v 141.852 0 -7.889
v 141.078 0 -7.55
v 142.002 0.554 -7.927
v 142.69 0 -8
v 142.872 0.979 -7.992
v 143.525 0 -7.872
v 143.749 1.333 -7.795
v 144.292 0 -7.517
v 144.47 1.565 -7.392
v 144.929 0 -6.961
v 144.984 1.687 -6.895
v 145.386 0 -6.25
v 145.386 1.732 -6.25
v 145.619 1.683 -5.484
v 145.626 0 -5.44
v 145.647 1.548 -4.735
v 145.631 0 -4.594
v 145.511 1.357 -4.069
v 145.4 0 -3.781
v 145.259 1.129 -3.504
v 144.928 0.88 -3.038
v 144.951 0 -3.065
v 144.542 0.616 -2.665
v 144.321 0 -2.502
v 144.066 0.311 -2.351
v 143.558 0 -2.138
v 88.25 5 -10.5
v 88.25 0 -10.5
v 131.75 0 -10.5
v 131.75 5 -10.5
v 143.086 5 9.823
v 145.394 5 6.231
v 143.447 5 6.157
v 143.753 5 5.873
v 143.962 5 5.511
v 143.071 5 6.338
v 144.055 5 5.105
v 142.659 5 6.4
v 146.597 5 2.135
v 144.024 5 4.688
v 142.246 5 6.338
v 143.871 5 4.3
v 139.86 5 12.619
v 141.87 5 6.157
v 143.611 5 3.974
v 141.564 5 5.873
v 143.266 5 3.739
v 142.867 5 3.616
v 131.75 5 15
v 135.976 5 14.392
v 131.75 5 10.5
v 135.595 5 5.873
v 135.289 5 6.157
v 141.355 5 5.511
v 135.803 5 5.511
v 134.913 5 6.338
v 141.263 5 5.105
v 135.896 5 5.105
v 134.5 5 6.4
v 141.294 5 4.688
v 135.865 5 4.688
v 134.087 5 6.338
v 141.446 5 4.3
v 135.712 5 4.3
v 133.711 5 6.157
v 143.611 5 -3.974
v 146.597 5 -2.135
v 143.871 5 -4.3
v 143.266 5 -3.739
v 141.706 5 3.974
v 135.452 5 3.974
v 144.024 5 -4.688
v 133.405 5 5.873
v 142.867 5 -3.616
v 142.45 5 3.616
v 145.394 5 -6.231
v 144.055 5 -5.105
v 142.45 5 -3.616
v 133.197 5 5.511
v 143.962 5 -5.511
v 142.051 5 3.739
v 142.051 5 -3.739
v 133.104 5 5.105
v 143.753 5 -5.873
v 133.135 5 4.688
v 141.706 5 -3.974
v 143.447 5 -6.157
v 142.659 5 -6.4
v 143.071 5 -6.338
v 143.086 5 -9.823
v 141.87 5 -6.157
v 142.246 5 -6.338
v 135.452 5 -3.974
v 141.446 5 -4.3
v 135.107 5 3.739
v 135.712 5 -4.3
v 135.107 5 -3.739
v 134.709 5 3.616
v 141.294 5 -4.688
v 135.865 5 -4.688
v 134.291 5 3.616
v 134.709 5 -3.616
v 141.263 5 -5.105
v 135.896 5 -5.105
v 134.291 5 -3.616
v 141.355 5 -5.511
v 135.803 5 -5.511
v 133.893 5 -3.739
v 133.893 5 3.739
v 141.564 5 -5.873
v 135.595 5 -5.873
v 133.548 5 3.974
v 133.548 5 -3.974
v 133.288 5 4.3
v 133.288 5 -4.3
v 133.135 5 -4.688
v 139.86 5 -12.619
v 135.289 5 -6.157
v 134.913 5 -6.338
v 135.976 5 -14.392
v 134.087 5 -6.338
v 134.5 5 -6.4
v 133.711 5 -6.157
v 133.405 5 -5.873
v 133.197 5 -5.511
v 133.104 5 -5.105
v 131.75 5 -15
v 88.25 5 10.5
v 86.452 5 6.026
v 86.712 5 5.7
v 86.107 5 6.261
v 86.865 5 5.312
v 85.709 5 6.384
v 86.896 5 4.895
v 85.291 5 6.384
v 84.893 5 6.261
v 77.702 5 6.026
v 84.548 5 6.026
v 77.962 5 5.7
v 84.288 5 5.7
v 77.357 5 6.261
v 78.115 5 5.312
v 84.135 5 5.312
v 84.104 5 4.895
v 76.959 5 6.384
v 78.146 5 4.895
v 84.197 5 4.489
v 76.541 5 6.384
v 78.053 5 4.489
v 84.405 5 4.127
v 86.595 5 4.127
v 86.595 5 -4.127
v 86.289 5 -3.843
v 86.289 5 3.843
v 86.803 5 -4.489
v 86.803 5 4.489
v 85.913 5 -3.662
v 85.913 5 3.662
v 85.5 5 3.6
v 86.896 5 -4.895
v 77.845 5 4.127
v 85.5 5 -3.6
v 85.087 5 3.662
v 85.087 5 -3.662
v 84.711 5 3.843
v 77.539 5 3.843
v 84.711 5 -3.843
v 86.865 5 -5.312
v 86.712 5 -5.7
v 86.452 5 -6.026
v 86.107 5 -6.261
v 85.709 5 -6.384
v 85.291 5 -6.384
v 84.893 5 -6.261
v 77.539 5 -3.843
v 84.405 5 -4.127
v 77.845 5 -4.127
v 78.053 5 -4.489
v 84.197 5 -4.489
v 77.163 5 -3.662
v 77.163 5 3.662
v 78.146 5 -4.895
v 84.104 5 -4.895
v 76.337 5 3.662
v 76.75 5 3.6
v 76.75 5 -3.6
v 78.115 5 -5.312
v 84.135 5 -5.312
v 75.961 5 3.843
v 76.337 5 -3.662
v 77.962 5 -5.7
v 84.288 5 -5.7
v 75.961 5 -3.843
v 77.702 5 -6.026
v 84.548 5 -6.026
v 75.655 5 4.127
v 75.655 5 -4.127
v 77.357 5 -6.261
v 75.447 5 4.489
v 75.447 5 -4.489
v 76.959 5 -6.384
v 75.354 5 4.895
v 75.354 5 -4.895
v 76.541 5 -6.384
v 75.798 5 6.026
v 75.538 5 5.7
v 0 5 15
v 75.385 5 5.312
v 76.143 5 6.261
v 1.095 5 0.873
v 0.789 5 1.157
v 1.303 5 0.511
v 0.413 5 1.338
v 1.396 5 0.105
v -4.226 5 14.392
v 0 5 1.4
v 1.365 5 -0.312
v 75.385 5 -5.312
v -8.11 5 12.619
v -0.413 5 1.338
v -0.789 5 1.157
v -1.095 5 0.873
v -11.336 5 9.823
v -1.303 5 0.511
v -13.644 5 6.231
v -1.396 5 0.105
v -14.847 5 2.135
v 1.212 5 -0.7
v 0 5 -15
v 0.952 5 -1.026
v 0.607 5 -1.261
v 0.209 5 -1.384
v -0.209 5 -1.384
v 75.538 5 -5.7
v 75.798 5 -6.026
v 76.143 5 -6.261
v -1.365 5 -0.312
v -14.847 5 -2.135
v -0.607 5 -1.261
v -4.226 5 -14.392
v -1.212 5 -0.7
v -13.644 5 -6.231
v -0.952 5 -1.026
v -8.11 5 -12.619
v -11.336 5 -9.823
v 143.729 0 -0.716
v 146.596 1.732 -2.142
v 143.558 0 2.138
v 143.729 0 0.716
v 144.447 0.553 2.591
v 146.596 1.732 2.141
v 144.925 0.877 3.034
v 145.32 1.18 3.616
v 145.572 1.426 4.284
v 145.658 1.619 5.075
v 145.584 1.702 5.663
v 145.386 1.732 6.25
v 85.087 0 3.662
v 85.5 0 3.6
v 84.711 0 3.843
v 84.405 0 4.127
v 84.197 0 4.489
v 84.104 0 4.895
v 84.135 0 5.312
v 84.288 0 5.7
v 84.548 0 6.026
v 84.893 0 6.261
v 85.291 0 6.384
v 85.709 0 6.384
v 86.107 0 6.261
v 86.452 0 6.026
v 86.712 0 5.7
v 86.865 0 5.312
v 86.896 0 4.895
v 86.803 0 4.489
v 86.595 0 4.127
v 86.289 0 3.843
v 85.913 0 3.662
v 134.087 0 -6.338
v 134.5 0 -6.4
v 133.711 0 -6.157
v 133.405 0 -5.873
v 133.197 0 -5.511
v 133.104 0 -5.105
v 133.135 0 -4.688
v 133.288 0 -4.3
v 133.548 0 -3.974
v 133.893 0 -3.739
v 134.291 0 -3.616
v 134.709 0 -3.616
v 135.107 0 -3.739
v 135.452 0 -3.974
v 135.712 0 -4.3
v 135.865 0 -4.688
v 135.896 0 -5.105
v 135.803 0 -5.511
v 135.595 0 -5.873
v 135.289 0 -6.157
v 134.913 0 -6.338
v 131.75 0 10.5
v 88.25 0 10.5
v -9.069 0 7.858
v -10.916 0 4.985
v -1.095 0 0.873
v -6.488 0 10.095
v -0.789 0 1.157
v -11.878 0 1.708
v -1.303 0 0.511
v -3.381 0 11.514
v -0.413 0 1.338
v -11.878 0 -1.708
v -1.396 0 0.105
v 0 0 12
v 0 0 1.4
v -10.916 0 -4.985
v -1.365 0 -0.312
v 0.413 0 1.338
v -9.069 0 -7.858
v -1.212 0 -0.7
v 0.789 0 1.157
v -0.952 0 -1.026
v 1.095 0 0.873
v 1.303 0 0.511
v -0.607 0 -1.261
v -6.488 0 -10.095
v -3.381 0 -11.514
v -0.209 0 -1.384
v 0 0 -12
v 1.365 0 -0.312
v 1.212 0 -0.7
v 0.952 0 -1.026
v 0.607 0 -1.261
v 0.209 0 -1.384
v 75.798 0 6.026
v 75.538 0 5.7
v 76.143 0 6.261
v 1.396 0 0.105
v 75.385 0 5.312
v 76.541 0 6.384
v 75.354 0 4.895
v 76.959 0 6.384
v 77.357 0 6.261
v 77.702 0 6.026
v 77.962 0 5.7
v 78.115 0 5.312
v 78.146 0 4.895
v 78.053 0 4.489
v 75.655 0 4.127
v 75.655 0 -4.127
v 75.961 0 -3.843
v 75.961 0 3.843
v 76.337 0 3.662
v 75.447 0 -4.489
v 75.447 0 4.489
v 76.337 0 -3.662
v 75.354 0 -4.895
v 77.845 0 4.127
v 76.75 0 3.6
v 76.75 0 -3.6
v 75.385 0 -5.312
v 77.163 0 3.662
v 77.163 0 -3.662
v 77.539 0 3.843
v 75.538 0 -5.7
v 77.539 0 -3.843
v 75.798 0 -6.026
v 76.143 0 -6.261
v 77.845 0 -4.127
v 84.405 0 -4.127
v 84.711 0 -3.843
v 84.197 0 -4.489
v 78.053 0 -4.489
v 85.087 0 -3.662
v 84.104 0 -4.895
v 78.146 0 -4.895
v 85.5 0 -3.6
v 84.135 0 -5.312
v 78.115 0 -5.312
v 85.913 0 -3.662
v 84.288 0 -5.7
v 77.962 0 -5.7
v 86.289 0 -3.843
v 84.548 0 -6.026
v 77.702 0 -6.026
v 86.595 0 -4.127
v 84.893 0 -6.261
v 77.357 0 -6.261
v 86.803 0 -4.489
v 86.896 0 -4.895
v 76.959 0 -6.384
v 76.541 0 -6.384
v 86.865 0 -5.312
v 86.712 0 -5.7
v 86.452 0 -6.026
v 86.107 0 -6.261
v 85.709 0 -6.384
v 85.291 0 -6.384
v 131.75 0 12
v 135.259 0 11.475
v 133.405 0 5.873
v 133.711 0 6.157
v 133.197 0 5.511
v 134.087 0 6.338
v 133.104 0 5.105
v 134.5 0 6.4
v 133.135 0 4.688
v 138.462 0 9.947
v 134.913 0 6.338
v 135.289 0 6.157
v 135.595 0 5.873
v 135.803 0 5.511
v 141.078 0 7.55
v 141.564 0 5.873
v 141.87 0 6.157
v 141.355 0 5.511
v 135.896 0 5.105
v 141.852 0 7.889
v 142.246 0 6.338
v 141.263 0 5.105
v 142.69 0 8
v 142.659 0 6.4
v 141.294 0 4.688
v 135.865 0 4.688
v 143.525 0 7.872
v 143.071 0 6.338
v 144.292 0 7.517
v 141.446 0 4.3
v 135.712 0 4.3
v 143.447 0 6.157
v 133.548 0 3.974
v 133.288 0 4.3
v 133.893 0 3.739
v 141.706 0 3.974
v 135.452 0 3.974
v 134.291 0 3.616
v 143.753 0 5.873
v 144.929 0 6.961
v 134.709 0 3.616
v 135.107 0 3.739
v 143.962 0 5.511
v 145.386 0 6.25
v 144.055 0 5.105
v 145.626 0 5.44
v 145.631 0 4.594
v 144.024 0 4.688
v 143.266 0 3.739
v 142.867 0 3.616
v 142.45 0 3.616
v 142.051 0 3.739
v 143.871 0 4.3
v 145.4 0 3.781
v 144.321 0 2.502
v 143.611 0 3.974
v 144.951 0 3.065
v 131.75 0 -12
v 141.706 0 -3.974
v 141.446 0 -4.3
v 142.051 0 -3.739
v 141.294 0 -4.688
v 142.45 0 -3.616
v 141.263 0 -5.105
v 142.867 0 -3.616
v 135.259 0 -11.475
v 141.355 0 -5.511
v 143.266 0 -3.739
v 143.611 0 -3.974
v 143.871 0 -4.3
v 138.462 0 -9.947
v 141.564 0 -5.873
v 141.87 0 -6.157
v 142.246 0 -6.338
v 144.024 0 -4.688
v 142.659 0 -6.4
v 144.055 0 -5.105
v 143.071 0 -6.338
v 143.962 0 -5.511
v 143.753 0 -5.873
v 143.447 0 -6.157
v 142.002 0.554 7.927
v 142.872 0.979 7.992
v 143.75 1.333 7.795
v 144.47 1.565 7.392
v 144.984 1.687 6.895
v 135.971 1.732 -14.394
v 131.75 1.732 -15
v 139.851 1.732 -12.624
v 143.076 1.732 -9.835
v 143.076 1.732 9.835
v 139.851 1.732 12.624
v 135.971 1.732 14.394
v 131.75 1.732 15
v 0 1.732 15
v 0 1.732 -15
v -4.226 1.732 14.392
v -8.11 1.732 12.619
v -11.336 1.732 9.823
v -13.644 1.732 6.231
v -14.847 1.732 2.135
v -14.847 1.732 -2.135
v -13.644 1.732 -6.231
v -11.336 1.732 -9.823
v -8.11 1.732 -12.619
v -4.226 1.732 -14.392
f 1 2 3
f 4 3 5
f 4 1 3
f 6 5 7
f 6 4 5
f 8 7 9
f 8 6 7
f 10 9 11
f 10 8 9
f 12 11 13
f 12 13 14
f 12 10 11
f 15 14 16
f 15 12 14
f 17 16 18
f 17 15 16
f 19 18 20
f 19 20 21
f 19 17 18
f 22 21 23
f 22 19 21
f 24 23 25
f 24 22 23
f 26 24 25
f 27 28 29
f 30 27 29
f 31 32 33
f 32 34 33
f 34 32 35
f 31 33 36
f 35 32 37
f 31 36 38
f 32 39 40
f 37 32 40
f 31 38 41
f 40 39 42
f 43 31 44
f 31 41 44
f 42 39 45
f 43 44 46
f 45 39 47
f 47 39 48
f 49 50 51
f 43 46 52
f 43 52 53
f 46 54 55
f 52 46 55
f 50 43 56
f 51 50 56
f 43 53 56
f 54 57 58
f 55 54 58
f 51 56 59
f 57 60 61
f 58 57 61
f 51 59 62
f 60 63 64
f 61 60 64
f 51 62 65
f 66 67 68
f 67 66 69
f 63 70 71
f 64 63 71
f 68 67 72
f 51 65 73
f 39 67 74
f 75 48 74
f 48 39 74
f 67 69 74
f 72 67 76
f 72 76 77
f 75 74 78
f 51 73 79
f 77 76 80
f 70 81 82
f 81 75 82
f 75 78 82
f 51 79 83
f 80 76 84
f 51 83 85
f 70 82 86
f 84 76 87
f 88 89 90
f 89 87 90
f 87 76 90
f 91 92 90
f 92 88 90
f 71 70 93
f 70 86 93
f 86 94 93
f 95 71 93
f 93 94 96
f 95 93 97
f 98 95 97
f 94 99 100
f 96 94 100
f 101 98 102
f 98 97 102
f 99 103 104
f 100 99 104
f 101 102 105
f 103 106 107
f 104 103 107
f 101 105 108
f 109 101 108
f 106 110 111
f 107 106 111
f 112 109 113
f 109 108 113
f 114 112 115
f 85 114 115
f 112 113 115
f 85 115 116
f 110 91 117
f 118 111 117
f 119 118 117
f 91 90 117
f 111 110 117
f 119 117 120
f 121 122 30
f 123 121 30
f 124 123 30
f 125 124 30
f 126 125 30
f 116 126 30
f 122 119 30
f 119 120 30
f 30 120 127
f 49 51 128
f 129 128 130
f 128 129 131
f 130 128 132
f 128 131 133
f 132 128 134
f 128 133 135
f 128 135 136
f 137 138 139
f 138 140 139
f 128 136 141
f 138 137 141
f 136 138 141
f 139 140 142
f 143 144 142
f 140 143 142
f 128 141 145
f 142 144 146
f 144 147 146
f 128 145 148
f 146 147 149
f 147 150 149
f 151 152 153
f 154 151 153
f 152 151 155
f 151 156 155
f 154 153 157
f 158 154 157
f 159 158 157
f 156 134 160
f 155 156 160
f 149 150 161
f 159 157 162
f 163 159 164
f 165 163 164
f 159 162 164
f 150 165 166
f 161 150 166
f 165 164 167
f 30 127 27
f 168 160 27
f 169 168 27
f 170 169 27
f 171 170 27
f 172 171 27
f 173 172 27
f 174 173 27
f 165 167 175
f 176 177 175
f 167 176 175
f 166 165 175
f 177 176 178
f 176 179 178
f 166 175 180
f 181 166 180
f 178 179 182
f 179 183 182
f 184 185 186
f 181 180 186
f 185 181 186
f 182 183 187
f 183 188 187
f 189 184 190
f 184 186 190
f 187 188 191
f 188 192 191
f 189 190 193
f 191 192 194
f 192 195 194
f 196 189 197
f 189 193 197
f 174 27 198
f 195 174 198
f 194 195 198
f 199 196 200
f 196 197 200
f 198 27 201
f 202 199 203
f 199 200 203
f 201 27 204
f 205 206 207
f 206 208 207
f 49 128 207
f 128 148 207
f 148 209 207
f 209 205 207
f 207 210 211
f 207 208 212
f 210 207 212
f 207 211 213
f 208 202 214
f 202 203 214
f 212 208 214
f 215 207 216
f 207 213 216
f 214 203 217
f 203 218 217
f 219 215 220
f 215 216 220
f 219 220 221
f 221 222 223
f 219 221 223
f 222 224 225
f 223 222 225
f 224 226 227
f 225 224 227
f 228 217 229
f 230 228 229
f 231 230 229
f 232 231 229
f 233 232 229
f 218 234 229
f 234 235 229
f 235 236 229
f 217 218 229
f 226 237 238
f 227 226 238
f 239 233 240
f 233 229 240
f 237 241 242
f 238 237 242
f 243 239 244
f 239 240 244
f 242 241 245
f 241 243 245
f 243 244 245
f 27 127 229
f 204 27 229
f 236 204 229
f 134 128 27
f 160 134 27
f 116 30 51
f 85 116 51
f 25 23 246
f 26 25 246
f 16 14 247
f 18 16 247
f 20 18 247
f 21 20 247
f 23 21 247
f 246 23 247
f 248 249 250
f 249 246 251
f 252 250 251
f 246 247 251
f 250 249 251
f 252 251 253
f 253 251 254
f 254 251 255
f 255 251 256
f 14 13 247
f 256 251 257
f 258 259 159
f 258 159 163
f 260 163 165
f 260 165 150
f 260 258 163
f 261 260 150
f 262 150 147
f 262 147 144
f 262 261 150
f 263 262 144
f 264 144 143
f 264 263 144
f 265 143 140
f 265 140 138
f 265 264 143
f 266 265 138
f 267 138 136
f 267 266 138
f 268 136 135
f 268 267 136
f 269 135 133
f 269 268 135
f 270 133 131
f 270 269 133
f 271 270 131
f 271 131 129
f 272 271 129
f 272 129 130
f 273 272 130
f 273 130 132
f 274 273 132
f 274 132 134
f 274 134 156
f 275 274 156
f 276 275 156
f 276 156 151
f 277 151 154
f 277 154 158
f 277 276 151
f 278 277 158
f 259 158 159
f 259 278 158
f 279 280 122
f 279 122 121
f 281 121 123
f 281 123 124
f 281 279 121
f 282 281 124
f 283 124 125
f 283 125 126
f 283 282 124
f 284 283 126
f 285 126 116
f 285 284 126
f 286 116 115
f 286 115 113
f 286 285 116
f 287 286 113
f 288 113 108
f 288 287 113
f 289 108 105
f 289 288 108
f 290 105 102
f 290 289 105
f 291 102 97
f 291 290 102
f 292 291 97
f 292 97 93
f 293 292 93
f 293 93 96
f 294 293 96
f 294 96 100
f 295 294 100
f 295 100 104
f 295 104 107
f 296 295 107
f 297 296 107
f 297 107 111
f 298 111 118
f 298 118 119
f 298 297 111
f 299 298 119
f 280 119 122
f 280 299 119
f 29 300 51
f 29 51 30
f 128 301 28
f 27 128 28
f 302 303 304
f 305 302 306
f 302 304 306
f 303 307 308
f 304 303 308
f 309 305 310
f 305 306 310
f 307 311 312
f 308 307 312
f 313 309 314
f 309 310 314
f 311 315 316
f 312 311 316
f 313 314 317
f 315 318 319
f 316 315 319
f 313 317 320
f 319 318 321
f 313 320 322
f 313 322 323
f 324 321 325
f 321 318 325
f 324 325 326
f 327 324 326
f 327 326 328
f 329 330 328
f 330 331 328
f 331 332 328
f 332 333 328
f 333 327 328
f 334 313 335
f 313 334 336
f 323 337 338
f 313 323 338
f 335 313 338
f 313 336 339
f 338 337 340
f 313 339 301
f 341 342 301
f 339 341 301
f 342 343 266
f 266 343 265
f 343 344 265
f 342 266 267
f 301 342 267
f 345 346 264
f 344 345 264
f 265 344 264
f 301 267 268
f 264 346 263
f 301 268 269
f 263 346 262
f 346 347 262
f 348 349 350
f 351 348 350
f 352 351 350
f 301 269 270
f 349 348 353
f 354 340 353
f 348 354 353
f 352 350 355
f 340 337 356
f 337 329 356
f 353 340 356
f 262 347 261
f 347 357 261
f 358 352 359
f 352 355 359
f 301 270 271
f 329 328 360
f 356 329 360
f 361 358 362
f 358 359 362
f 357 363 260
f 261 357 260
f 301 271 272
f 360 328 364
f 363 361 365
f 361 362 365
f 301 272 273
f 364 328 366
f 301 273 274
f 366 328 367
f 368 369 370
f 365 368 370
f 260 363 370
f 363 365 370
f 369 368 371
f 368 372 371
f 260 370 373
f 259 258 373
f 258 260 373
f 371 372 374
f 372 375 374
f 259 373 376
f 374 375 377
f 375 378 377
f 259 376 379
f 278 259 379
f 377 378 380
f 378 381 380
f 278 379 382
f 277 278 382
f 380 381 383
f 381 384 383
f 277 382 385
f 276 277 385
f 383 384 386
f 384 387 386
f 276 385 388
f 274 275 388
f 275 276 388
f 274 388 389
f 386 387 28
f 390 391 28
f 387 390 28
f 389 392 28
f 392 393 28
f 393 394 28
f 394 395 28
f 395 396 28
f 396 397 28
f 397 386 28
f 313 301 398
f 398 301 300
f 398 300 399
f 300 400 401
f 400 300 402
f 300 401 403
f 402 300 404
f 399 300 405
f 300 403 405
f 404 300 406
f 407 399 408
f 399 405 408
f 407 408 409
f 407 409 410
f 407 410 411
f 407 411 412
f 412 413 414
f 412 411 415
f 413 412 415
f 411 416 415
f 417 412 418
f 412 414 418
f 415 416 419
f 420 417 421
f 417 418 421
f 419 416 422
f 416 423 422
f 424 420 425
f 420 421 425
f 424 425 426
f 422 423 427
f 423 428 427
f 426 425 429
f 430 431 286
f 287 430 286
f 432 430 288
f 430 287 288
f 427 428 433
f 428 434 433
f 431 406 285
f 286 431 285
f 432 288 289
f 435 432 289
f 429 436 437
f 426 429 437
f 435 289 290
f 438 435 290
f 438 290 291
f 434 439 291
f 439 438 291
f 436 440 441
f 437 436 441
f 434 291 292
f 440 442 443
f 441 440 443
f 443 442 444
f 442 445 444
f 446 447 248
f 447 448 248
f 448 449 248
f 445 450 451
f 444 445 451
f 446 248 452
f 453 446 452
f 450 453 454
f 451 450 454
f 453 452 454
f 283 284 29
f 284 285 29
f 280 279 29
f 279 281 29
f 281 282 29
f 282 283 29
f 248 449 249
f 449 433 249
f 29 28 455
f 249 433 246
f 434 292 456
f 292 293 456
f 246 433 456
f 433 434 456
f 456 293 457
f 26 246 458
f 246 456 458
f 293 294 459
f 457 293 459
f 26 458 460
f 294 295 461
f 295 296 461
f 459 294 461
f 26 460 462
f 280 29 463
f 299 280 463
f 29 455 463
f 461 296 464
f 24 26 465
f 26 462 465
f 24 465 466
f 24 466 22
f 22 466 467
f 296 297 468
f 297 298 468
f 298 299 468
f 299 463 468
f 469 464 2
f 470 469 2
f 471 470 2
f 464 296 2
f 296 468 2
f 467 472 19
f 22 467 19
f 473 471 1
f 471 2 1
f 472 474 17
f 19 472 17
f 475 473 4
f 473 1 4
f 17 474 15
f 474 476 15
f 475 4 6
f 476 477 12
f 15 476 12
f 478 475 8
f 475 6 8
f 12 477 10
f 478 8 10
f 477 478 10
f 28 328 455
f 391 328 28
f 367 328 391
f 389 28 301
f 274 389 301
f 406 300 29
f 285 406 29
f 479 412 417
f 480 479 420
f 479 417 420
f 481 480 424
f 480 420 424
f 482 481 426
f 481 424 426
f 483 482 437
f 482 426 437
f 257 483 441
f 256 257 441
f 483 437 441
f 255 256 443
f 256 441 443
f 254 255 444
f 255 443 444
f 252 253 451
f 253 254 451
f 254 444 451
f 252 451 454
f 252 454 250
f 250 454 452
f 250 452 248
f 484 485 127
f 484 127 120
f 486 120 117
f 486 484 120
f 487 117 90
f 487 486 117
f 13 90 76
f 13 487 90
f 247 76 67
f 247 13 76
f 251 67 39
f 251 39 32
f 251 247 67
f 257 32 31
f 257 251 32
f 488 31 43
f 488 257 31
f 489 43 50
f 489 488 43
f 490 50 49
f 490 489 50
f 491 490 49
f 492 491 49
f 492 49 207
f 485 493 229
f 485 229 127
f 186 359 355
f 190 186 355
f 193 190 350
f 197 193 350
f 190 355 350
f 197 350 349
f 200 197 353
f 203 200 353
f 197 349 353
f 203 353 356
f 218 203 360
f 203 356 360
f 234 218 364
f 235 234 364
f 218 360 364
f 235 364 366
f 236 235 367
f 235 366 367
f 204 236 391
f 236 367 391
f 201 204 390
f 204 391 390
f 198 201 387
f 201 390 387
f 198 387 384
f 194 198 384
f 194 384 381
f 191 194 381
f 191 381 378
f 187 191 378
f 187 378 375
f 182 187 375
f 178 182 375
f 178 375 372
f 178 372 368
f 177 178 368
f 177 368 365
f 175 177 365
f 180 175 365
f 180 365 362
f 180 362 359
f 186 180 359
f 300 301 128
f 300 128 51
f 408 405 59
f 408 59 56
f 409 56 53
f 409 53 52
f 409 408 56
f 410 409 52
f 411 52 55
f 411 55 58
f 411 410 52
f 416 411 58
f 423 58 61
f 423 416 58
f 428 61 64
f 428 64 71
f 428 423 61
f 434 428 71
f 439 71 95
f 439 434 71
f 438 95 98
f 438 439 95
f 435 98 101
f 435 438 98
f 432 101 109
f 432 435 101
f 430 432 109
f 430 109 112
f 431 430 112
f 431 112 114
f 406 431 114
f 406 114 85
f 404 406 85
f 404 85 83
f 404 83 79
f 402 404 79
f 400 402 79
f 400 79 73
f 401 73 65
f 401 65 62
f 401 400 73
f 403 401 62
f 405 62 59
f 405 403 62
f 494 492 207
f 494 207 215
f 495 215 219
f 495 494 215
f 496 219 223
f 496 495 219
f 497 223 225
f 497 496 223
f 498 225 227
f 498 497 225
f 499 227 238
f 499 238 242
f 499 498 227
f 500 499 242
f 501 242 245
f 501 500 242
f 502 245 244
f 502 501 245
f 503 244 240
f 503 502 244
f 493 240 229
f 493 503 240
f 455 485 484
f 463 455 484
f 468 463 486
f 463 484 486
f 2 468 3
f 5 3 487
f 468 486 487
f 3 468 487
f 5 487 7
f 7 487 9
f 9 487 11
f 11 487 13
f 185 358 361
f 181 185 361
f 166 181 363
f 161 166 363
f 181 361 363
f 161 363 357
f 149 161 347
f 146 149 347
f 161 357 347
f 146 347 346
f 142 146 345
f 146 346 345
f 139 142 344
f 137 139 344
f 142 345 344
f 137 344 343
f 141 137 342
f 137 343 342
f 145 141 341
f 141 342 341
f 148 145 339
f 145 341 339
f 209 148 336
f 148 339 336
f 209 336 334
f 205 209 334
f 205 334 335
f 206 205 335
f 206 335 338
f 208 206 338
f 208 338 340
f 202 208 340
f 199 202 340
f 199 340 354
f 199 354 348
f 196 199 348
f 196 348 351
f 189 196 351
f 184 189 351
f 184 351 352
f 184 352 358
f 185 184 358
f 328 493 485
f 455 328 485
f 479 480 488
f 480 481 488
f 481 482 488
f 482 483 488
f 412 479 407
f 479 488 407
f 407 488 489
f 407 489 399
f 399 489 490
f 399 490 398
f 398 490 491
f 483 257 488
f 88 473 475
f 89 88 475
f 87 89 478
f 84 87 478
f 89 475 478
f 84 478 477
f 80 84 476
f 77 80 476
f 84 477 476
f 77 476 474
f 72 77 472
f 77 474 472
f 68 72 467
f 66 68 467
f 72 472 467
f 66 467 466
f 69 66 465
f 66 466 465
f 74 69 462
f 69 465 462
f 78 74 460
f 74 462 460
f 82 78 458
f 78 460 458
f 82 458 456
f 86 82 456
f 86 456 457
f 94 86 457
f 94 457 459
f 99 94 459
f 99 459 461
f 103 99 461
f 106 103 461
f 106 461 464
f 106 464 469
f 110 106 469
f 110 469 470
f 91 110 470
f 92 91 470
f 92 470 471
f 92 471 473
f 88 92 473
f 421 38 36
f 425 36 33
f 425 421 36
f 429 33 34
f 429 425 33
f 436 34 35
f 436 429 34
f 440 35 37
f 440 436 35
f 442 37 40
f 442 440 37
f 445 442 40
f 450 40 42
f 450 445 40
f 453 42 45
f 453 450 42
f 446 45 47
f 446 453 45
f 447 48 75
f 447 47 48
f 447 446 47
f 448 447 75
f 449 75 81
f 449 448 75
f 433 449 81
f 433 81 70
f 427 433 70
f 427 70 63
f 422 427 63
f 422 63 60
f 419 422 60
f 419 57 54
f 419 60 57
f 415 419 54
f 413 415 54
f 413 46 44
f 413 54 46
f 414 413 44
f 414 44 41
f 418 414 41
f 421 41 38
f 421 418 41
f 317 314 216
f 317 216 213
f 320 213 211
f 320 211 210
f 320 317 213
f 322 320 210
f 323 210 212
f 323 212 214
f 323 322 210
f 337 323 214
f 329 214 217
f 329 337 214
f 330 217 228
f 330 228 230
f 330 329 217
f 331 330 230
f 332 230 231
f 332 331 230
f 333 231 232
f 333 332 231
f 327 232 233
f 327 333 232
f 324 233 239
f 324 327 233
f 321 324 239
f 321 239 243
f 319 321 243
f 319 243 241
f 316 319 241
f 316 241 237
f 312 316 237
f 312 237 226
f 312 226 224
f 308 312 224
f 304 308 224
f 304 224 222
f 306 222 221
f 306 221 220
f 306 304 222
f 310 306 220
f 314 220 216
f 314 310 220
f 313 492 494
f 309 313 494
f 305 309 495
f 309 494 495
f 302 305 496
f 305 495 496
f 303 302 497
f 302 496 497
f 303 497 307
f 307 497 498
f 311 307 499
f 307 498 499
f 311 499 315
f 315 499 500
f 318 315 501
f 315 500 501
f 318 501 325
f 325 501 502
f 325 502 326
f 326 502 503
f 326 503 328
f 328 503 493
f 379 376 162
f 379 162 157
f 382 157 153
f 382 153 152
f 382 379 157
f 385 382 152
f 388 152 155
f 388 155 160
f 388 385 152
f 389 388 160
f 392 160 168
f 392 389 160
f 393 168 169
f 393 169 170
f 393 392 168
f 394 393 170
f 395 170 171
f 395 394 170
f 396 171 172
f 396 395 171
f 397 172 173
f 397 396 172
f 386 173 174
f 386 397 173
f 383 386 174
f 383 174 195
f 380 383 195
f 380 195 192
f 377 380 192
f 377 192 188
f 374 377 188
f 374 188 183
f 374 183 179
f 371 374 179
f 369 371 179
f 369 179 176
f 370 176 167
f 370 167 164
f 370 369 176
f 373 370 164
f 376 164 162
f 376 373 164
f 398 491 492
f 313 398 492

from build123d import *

# Parameters (mm, degrees)
SKETCH1_R           = 1.4
SKETCH1_W           = 43.5
SKETCH1_H           = 21
BOSS_EXTRUDE1_DEPTH = 5
CHAMFER1_SIZE       = 3
CHAMFER1_SIZE2      = 1.732050808
SKETCH3_R           = 1.4
CUT_EXTRUDE2_DEPTH  = 148.599330961
SKETCH5_R           = 3
BOSS_EXTRUDE2_DEPTH = 5
SKETCH6_R           = 1.4
CUT_EXTRUDE3_DEPTH  = 148.59933107


with BuildPart() as part:
    # Sketch1 → Boss-Extrude1 (new body)
    with BuildSketch(Plane(origin=(0, 0, 0), x_dir=(1, 0, 0), z_dir=(0, 1, 0))):
        with BuildLine():
            Line((0, 15), (131.75, 15))
            ThreePointArc((131.75, 15), (146.75, 0), (131.75, -15))
            Line((131.75, -15), (0, -15))
            ThreePointArc((0, -15), (-15, 0), (0, 15))
        make_face()
        Circle(SKETCH1_R, mode=Mode.SUBTRACT)
        with Locations((85.5, 5)):
            Circle(SKETCH1_R, mode=Mode.SUBTRACT)
        with Locations((85.5, -5)):
            Circle(SKETCH1_R, mode=Mode.SUBTRACT)
        with Locations((134.5, -5)):
            Circle(SKETCH1_R, mode=Mode.SUBTRACT)
        with Locations((134.5, 5)):
            Circle(SKETCH1_R, mode=Mode.SUBTRACT)
        with Locations((110, 0)):
            Rectangle(SKETCH1_W, SKETCH1_H, mode=Mode.SUBTRACT)
    extrude(amount=BOSS_EXTRUDE1_DEPTH)

    # Chamfer1
    chamfer1_edges = [part.edges().sort_by_distance(p)[0] for p in [
        (-15, 0, 0),
        (65.875, 0, -15),
        (146.75, 0, 0),
        (65.875, 0, 15),
    ]]
    chamfer1_side = [part.faces().sort_by_distance(p)[0] for p in [
        (54.841734093, 0, 0),
    ]]
    chamfer(chamfer1_edges, length=CHAMFER1_SIZE, length2=CHAMFER1_SIZE2, reference=chamfer1_side[0])

    # Sketch3 → Cut-Extrude2 (cut, through all)
    with BuildSketch(Plane.XZ):
        with Locations((76.75, 5)):
            Circle(SKETCH3_R)
        with Locations((76.75, -5)):
            Circle(SKETCH3_R)
    extrude(amount=-CUT_EXTRUDE2_DEPTH, mode=Mode.SUBTRACT)

    # Sketch5 → Boss-Extrude2 (add)
    with BuildSketch(Plane.XZ):
        with Locations((142.658712115, -5)):
            Circle(SKETCH5_R)
    boss_extrude2 = extrude(amount=-BOSS_EXTRUDE2_DEPTH)

    # Sketch6 → Cut-Extrude3 (cut, through all)
    with BuildSketch(Plane.XZ):
        with Locations((142.658712115, -5)):
            Circle(SKETCH6_R)
    cut_extrude3 = extrude(amount=-CUT_EXTRUDE3_DEPTH, mode=Mode.SUBTRACT)

    # Mirror1: Boss-Extrude2, Cut-Extrude3 across plane
    add(boss_extrude2.mirror(Plane.XY))
    add(cut_extrude3.mirror(Plane.XY), mode=Mode.SUBTRACT)


solid = part.part
